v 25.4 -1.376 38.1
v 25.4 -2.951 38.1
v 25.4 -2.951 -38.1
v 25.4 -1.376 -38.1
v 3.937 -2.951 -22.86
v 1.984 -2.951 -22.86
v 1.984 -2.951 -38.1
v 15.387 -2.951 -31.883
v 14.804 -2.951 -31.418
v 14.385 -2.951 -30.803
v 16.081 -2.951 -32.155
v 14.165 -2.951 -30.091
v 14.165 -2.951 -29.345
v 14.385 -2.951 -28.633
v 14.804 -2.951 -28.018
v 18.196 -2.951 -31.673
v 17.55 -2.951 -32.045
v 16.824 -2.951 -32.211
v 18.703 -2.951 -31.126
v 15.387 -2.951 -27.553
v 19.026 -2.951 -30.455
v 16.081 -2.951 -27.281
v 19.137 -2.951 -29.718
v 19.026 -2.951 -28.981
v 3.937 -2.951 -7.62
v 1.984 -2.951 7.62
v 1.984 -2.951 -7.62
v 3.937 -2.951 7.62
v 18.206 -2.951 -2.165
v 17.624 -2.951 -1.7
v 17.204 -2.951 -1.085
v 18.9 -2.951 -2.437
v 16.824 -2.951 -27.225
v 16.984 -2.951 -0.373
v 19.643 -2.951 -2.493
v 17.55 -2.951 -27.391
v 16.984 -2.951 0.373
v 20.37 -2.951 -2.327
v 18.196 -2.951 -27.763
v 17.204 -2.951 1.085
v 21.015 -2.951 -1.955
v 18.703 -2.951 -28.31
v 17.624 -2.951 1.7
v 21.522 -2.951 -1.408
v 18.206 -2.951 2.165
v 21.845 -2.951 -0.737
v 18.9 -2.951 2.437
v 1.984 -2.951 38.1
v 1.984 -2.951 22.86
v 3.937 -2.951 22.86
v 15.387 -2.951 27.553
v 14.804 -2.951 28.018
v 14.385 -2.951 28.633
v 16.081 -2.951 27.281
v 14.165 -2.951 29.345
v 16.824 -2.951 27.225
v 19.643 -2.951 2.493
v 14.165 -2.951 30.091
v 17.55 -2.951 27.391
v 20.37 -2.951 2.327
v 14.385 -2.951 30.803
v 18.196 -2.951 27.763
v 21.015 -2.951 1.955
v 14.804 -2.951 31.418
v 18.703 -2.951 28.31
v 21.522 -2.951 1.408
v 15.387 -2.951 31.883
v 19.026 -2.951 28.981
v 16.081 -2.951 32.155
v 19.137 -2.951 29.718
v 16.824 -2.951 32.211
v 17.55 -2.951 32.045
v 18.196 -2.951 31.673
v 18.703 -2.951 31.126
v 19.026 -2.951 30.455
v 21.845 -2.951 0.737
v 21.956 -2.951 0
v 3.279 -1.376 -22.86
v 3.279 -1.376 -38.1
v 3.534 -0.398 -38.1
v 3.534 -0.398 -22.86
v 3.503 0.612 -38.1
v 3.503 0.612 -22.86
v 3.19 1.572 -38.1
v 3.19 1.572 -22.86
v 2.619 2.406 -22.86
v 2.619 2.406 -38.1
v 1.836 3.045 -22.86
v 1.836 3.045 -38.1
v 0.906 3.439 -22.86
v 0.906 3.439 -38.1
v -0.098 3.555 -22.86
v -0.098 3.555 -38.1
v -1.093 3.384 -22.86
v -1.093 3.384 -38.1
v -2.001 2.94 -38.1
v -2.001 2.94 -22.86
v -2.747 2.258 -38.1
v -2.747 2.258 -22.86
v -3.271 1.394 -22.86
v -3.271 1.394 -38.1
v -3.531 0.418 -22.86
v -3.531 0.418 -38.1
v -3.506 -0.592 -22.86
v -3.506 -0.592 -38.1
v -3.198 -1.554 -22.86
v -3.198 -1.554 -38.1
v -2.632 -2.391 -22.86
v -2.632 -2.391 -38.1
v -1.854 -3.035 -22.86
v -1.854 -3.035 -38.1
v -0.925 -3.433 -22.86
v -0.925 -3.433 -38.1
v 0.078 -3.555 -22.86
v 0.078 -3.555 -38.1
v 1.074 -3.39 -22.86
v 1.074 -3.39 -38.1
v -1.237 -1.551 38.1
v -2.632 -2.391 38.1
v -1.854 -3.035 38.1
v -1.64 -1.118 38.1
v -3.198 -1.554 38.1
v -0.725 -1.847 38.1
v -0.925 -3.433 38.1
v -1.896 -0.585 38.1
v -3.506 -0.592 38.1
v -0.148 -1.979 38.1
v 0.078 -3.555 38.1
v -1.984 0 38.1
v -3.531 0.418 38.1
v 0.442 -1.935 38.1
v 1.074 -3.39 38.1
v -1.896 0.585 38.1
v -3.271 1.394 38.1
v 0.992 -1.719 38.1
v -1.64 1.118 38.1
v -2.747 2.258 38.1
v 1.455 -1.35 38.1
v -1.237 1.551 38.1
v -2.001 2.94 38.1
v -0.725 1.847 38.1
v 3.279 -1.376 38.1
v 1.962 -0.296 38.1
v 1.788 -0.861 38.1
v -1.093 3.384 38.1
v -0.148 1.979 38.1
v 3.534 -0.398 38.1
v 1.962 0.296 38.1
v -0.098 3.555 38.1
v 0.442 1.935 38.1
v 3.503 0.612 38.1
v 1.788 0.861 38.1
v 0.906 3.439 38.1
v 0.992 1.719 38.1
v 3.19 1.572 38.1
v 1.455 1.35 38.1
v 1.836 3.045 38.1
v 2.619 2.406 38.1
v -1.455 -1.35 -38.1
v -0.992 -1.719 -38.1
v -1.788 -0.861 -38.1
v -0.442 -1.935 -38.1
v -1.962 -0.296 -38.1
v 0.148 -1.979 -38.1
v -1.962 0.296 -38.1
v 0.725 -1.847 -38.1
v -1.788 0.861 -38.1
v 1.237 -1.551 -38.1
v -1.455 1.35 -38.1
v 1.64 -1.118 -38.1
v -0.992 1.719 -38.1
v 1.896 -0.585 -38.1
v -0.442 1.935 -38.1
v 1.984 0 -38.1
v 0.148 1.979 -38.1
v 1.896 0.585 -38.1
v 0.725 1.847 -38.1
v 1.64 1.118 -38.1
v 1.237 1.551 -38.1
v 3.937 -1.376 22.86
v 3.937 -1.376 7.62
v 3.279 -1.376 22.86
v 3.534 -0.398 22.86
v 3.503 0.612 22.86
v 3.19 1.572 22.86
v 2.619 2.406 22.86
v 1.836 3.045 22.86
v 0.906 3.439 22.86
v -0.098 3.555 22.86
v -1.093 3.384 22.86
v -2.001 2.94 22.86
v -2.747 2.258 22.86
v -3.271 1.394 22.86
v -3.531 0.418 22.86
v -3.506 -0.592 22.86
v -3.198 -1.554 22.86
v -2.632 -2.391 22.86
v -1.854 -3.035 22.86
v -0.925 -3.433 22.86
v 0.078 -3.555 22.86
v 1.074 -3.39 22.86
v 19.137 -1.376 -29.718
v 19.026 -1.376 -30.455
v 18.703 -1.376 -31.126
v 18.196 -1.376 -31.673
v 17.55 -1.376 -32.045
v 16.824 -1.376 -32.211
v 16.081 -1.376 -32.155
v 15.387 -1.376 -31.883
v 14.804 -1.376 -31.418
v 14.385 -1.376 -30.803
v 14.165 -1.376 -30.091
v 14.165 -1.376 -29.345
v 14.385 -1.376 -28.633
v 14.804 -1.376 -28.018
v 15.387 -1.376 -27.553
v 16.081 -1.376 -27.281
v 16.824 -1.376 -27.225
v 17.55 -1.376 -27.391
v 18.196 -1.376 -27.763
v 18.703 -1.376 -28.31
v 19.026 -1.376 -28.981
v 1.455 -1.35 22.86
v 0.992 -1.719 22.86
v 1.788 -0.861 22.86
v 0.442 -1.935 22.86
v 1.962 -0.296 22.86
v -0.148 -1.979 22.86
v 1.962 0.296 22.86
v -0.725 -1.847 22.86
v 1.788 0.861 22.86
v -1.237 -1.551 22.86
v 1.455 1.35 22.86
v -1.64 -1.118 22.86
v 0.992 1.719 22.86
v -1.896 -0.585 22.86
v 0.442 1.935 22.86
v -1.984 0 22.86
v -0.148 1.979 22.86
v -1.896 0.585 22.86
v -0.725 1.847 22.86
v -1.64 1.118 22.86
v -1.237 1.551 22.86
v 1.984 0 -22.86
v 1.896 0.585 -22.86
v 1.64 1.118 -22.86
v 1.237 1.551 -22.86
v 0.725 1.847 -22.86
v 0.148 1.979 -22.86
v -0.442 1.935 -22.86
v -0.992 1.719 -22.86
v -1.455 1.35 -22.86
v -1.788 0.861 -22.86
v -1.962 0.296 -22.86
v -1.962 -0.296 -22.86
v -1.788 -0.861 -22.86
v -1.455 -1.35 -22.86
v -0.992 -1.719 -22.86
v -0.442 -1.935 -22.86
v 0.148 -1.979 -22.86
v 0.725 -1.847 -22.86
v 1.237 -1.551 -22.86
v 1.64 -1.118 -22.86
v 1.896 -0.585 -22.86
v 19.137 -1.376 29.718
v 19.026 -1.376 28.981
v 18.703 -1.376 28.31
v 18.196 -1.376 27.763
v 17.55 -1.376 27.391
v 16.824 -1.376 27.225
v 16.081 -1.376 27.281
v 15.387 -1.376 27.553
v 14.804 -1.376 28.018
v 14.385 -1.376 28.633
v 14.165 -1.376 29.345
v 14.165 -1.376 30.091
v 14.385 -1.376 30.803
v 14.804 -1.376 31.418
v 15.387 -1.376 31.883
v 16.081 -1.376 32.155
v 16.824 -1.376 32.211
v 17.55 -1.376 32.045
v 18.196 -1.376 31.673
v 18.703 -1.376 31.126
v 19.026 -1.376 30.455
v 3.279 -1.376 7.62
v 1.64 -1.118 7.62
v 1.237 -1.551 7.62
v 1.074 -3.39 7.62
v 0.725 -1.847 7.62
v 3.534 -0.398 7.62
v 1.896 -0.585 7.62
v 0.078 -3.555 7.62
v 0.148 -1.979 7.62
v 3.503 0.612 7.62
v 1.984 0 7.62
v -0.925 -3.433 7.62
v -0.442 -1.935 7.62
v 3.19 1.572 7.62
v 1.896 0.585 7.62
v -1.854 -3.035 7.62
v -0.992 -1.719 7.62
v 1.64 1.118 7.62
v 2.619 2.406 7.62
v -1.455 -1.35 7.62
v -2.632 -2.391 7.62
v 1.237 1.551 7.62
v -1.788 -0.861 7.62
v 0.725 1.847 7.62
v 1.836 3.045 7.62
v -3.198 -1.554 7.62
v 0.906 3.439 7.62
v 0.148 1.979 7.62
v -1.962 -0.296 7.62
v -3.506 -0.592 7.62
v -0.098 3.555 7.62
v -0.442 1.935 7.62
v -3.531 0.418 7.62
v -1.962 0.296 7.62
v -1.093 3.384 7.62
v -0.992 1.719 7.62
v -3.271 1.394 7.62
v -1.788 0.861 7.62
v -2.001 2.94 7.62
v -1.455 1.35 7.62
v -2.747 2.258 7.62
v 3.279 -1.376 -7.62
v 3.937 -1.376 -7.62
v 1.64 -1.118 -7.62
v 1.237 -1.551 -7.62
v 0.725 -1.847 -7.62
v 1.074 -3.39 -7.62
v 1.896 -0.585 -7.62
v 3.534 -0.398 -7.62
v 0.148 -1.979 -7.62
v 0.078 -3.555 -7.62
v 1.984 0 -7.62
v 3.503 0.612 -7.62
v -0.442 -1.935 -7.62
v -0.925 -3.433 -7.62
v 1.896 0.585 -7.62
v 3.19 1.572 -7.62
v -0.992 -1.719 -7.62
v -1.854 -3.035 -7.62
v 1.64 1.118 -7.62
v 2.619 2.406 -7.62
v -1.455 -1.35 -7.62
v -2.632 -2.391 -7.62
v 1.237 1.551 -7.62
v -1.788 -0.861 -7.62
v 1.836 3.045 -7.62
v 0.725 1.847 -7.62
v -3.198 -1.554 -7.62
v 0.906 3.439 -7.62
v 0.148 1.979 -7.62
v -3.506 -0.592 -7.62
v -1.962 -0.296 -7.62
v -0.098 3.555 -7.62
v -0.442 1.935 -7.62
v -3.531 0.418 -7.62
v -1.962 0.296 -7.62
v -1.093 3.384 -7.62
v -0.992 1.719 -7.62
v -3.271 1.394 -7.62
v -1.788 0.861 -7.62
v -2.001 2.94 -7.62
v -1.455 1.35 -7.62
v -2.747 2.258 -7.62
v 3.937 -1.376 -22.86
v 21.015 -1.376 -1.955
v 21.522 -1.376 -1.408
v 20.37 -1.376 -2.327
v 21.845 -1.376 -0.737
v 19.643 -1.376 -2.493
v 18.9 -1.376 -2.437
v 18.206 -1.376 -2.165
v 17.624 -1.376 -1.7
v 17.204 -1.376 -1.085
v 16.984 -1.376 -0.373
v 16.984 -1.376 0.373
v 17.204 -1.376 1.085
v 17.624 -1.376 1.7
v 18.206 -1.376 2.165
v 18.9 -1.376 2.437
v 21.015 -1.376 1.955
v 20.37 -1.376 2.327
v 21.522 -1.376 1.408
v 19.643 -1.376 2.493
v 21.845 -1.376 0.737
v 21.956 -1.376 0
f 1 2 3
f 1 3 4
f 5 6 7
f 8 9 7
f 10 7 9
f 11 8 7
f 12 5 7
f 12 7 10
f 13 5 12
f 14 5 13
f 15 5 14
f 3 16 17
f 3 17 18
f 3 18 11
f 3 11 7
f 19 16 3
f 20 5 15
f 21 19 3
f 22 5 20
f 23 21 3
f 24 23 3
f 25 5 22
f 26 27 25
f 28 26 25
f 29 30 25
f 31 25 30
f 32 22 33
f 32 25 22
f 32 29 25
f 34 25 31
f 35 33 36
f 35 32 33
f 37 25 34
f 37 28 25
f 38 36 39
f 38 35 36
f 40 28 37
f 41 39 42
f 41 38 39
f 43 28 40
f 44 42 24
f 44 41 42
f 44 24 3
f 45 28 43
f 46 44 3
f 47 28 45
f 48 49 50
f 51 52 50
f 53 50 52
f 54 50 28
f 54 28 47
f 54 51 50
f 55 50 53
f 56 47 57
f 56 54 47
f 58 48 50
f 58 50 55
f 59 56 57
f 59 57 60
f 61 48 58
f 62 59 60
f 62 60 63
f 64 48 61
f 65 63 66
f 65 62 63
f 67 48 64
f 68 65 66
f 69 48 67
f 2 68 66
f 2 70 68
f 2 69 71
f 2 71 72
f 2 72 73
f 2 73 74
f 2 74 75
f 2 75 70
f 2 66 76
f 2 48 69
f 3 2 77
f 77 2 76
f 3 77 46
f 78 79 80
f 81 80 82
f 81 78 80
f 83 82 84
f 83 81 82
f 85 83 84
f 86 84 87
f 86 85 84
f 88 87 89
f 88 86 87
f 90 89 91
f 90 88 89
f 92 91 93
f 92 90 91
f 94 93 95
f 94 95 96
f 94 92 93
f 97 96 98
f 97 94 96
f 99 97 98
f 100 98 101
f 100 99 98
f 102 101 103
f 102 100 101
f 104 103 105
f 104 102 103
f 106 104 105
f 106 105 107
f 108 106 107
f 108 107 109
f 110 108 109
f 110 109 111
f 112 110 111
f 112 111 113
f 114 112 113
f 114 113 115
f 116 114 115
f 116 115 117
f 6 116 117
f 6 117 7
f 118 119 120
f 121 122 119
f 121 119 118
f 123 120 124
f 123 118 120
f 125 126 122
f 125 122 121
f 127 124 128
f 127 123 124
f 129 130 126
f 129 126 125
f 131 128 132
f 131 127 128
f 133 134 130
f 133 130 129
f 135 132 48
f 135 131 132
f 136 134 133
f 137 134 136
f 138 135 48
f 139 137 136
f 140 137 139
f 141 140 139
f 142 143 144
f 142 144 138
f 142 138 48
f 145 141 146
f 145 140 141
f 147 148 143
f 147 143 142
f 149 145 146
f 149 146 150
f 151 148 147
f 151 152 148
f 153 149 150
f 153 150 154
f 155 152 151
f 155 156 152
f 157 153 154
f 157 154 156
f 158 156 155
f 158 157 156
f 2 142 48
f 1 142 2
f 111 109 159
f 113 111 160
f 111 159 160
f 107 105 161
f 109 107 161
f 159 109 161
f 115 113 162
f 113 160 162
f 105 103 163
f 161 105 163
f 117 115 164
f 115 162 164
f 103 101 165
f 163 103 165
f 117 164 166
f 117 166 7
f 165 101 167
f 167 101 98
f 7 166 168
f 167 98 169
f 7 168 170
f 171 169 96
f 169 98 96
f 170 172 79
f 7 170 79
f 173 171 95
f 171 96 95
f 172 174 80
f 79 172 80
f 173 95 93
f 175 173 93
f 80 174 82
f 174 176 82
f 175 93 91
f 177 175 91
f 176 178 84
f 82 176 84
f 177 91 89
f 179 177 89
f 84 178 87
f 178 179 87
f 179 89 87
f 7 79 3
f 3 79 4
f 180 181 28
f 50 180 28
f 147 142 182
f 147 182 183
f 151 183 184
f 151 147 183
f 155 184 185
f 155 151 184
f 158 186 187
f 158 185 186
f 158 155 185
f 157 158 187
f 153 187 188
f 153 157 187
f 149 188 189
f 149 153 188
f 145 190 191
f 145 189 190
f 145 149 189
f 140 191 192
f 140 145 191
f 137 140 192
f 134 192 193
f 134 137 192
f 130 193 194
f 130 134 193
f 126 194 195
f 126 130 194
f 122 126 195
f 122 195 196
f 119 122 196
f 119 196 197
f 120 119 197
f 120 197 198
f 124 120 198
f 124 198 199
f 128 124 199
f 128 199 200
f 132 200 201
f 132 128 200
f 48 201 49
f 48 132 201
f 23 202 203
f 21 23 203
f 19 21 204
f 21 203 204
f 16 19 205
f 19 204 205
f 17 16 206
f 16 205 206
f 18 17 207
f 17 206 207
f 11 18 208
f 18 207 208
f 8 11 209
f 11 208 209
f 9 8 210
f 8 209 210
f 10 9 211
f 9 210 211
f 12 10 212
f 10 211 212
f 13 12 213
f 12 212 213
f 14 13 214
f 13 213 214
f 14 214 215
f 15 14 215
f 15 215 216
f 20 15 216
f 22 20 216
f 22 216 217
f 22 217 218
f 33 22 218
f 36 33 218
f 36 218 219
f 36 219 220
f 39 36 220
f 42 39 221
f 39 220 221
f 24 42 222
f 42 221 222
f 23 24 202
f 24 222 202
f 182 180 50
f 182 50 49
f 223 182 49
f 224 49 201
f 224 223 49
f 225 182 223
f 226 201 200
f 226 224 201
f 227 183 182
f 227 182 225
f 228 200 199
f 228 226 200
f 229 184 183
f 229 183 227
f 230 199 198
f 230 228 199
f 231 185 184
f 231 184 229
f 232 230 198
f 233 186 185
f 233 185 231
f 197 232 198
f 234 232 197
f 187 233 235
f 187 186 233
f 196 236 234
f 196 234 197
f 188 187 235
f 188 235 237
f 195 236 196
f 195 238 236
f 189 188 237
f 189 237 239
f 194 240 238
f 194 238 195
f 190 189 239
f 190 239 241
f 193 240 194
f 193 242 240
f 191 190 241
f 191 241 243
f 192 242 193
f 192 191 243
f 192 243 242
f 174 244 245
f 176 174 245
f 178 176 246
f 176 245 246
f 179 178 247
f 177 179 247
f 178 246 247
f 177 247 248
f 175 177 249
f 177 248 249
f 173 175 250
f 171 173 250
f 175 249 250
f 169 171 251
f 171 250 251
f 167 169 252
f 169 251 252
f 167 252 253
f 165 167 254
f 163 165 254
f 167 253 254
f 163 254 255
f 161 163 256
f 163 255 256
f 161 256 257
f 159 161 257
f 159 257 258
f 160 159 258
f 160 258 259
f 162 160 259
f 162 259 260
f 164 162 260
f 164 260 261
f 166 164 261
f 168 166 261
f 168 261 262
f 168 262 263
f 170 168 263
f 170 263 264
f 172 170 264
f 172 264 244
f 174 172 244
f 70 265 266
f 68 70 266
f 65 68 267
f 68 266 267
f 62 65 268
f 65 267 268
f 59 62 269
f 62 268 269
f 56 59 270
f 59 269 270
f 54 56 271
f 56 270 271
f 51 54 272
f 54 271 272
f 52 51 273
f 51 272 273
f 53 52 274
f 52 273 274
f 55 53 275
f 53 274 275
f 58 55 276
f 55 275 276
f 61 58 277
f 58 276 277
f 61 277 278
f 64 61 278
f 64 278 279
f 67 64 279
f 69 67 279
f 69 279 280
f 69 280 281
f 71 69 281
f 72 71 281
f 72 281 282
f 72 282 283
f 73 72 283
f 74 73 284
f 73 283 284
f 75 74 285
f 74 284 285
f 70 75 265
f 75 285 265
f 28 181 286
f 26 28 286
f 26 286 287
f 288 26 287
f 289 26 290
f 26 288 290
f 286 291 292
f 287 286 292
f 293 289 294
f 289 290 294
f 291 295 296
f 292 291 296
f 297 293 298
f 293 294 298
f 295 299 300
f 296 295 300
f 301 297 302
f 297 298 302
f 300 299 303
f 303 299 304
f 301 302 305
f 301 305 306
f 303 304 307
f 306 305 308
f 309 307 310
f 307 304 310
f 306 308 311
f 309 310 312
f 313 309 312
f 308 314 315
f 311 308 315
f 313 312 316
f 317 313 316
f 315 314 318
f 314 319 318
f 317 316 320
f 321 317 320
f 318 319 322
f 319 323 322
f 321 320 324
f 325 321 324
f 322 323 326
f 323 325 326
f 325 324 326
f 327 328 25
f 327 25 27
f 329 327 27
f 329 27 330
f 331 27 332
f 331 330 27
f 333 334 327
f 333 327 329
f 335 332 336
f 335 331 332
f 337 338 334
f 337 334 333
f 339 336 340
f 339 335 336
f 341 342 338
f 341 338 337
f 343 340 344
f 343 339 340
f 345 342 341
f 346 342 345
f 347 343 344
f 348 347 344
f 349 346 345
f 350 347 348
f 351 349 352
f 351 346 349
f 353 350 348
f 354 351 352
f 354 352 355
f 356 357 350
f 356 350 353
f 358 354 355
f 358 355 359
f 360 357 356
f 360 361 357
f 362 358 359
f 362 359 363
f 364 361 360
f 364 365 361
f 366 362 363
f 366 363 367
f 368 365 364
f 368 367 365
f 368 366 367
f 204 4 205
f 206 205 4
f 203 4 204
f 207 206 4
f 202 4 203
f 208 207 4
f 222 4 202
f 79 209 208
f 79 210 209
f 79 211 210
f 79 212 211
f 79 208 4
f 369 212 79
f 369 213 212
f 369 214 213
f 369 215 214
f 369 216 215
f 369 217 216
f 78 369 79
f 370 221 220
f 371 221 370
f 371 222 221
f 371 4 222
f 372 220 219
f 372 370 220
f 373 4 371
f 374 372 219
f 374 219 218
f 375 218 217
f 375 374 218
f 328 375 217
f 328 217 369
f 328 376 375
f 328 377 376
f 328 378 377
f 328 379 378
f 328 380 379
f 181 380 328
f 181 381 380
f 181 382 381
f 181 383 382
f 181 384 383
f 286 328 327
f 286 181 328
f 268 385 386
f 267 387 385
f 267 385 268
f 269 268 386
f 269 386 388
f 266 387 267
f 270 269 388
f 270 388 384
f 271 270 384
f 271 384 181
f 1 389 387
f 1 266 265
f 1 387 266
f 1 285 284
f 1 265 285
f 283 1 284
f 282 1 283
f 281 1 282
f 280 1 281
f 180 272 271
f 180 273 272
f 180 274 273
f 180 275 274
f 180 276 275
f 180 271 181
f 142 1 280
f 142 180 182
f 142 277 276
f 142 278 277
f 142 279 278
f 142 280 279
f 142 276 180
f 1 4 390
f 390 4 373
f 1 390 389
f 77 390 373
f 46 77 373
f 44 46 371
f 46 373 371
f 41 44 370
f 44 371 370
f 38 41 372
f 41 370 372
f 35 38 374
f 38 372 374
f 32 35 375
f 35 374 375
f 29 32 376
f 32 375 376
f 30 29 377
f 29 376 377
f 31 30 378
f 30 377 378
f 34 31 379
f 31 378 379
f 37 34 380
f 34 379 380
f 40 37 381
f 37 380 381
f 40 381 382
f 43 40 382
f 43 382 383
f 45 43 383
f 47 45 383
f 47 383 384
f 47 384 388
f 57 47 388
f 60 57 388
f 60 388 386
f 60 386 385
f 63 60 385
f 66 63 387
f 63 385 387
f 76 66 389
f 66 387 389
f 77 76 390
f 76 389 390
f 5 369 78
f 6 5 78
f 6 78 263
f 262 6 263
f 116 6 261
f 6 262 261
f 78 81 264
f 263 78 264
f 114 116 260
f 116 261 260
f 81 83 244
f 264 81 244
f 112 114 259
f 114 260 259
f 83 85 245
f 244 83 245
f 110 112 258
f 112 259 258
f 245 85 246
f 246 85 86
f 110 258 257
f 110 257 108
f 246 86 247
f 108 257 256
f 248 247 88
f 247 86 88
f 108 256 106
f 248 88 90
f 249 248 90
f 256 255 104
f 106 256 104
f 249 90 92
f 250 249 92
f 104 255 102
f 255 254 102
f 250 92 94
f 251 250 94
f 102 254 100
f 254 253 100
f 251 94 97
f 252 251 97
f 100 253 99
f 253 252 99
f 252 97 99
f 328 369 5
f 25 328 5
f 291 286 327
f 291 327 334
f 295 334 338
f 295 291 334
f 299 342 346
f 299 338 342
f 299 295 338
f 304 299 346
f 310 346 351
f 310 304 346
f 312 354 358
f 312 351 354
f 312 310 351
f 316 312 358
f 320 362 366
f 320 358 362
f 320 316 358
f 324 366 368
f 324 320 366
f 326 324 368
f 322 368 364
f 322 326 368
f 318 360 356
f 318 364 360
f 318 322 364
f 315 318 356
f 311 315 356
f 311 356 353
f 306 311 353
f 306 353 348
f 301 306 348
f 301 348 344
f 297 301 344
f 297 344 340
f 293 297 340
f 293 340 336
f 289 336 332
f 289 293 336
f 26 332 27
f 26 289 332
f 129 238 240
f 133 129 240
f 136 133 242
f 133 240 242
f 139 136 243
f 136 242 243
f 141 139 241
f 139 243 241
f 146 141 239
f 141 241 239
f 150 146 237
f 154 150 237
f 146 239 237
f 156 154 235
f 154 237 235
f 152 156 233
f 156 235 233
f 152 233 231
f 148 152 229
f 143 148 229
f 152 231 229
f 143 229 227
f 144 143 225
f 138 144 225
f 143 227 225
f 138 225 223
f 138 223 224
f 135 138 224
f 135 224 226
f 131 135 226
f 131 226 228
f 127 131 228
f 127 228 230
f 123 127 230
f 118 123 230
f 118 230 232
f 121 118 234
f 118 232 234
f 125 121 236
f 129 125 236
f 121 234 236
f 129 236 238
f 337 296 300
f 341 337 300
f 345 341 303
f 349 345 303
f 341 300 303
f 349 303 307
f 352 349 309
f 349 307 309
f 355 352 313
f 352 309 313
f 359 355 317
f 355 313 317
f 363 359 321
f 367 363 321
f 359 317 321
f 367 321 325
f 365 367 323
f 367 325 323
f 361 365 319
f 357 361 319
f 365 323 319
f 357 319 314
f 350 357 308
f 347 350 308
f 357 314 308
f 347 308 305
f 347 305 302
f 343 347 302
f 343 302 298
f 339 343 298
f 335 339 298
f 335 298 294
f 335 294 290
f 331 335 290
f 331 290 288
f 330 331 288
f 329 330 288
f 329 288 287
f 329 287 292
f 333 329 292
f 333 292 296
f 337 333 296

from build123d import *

# Parameters (mm, degrees)
BOSS_EXTRUDE1_DEPTH                            = 76.2
CUT_EXTRUDE1_DEPTH                             = 15.24
CUT_EXTRUDE2_DEPTH                             = 15.24
CSK_FOR_M3_FLAT_HEAD_MACHINE_SCREW1_AT_2_COUNT = 2
CSK_FOR_M3_FLAT_HEAD_MACHINE_SCREW1_AT_2_PITCH = 59.436
CSK_FOR_M3_FLAT_HEAD_MACHINE_SCREW1_AT_3_COUNT = 2
CSK_FOR_M3_FLAT_HEAD_MACHINE_SCREW1_AT_3_PITCH = 29.851441177
M3_5_CLEARANCE_HOLE1_D                         = 3.96875
M3_5_CLEARANCE_HOLE1_DEPTH                     = 15.24
M3_5_CLEARANCE_HOLE2_D                         = 3.96875
M3_5_CLEARANCE_HOLE2_DEPTH                     = 15.24
M3_5_CLEARANCE_HOLE3_D                         = 3.96875
M3_5_CLEARANCE_HOLE3_DEPTH                     = 45.72
SKETCH21_R                                     = 2.5
CUT_EXTRUDE3_DEPTH                             = 1.5748


with BuildPart() as part:
    # Sketch1 → Boss-Extrude1 (new body)
    with BuildSketch(Plane.XY.offset(38.1)):
        with BuildLine():
            Line((25.4, -2.950829012), (25.4, -1.376029012))
            Line((25.4, -1.376029012), (3.278975474, -1.376029012))
            ThreePointArc((3.278975474, -1.376029012), (-2.746946179, 2.258190135), (1.984375, -2.950829012))
            Line((1.984375, -2.950829012), (25.4, -2.950829012))
        make_face()
    extrude(amount=-BOSS_EXTRUDE1_DEPTH)

    # Sketch6 → Cut-Extrude1 (cut)
    with BuildSketch(Plane(origin=(0, 0, -22.86), x_dir=(-1, 0, 0), z_dir=(0, 0, -1))):
        with BuildLine():
            Line((-3.937, -1.376029012), (-3.937, -2.950829012))
            Line((-3.937, -2.950829012), (-1.984375, -2.950829012))
            ThreePointArc((-1.984375, -2.950829012), (2.746946179, 2.258190135), (-3.278975474, -1.376029012))
            Line((-3.278975474, -1.376029012), (-3.937, -1.376029012))
        make_face()
    extrude(amount=-CUT_EXTRUDE1_DEPTH, mode=Mode.SUBTRACT)

    # Sketch12 → Cut-Extrude2 (cut)
    with BuildSketch(Plane(origin=(0, 0, 7.62), x_dir=(-1, 0, 0), z_dir=(0, 0, -1))):
        with BuildLine():
            Line((-3.937, -1.376029012), (-3.937, -2.950829012))
            Line((-3.937, -2.950829012), (-1.984375, -2.950829012))
            ThreePointArc((-1.984375, -2.950829012), (2.746946179, 2.258190135), (-3.278975474, -1.376029012))
            Line((-3.278975474, -1.376029012), (-3.937, -1.376029012))
        make_face()
    extrude(amount=-CUT_EXTRUDE2_DEPTH, mode=Mode.SUBTRACT)

    # Sketch13 → CSK for M3 Flat Head Machine Screw1 (revolve, cut)
    with BuildSketch(Plane(origin=(16.637, -1.376029012, -29.718), x_dir=(0, 0, 1), z_dir=(1, 0, 0))):
        Polygon((0, 0), (0, 2.179970988), (1.7526, 2.179970988), (1.7526, 0.7874), (2.437076377, 0), align=None)
    csk_for_m3_flat_head_machine_screw1 = revolve(axis=Axis((16.637, 4.973970988, -29.718), (0, -1, 0)), mode=Mode.SUBTRACT)

    # CSK for M3 Flat Head Machine Screw1 at 2: CSK for M3 Flat Head Machine Screw1 ×2
    with Locations(*[(0, 0, i * CSK_FOR_M3_FLAT_HEAD_MACHINE_SCREW1_AT_2_PITCH) for i in range(1, CSK_FOR_M3_FLAT_HEAD_MACHINE_SCREW1_AT_2_COUNT)]):
        add(csk_for_m3_flat_head_machine_screw1, mode=Mode.SUBTRACT)

    # CSK for M3 Flat Head Machine Screw1 at 3: CSK for M3 Flat Head Machine Screw1 ×2
    with Locations(*[Vector(0.094447701, 0, 0.995529825) * (i * CSK_FOR_M3_FLAT_HEAD_MACHINE_SCREW1_AT_3_PITCH) for i in range(1, CSK_FOR_M3_FLAT_HEAD_MACHINE_SCREW1_AT_3_COUNT)]):
        add(csk_for_m3_flat_head_machine_screw1, mode=Mode.SUBTRACT)

    # M3.5 Clearance Hole1
    with Locations(Plane.XY.offset(38.1)):
        with Locations((0, 0)):
            Hole(M3_5_CLEARANCE_HOLE1_D / 2, depth=M3_5_CLEARANCE_HOLE1_DEPTH)

    # M3.5 Clearance Hole2
    with Locations(Plane(origin=(0, 0, -38.1), x_dir=(-1, 0, 0), z_dir=(0, 0, -1))):
        with Locations((0, 0)):
            Hole(M3_5_CLEARANCE_HOLE2_D / 2, depth=M3_5_CLEARANCE_HOLE2_DEPTH)

    # M3.5 Clearance Hole3
    with Locations(Plane(origin=(0, 0, -7.62), x_dir=(-1, 0, 0), z_dir=(0, 0, -1))):
        with Locations((0, 0)):
            Hole(M3_5_CLEARANCE_HOLE3_D / 2, depth=M3_5_CLEARANCE_HOLE3_DEPTH)

    # Sketch21 → Cut-Extrude3 (cut)
    with BuildSketch(Plane(origin=(0, -1.376029012, 0), x_dir=(1, 0, 0), z_dir=(0, 1, 0))):
        with Locations((16.637, 29.718)):
            Circle(SKETCH21_R)
        with Locations((19.4564, 0)):
            Circle(SKETCH21_R)
        with Locations((16.637, -29.718)):
            Circle(SKETCH21_R)
    extrude(amount=-CUT_EXTRUDE3_DEPTH, mode=Mode.SUBTRACT)


solid = part.part
